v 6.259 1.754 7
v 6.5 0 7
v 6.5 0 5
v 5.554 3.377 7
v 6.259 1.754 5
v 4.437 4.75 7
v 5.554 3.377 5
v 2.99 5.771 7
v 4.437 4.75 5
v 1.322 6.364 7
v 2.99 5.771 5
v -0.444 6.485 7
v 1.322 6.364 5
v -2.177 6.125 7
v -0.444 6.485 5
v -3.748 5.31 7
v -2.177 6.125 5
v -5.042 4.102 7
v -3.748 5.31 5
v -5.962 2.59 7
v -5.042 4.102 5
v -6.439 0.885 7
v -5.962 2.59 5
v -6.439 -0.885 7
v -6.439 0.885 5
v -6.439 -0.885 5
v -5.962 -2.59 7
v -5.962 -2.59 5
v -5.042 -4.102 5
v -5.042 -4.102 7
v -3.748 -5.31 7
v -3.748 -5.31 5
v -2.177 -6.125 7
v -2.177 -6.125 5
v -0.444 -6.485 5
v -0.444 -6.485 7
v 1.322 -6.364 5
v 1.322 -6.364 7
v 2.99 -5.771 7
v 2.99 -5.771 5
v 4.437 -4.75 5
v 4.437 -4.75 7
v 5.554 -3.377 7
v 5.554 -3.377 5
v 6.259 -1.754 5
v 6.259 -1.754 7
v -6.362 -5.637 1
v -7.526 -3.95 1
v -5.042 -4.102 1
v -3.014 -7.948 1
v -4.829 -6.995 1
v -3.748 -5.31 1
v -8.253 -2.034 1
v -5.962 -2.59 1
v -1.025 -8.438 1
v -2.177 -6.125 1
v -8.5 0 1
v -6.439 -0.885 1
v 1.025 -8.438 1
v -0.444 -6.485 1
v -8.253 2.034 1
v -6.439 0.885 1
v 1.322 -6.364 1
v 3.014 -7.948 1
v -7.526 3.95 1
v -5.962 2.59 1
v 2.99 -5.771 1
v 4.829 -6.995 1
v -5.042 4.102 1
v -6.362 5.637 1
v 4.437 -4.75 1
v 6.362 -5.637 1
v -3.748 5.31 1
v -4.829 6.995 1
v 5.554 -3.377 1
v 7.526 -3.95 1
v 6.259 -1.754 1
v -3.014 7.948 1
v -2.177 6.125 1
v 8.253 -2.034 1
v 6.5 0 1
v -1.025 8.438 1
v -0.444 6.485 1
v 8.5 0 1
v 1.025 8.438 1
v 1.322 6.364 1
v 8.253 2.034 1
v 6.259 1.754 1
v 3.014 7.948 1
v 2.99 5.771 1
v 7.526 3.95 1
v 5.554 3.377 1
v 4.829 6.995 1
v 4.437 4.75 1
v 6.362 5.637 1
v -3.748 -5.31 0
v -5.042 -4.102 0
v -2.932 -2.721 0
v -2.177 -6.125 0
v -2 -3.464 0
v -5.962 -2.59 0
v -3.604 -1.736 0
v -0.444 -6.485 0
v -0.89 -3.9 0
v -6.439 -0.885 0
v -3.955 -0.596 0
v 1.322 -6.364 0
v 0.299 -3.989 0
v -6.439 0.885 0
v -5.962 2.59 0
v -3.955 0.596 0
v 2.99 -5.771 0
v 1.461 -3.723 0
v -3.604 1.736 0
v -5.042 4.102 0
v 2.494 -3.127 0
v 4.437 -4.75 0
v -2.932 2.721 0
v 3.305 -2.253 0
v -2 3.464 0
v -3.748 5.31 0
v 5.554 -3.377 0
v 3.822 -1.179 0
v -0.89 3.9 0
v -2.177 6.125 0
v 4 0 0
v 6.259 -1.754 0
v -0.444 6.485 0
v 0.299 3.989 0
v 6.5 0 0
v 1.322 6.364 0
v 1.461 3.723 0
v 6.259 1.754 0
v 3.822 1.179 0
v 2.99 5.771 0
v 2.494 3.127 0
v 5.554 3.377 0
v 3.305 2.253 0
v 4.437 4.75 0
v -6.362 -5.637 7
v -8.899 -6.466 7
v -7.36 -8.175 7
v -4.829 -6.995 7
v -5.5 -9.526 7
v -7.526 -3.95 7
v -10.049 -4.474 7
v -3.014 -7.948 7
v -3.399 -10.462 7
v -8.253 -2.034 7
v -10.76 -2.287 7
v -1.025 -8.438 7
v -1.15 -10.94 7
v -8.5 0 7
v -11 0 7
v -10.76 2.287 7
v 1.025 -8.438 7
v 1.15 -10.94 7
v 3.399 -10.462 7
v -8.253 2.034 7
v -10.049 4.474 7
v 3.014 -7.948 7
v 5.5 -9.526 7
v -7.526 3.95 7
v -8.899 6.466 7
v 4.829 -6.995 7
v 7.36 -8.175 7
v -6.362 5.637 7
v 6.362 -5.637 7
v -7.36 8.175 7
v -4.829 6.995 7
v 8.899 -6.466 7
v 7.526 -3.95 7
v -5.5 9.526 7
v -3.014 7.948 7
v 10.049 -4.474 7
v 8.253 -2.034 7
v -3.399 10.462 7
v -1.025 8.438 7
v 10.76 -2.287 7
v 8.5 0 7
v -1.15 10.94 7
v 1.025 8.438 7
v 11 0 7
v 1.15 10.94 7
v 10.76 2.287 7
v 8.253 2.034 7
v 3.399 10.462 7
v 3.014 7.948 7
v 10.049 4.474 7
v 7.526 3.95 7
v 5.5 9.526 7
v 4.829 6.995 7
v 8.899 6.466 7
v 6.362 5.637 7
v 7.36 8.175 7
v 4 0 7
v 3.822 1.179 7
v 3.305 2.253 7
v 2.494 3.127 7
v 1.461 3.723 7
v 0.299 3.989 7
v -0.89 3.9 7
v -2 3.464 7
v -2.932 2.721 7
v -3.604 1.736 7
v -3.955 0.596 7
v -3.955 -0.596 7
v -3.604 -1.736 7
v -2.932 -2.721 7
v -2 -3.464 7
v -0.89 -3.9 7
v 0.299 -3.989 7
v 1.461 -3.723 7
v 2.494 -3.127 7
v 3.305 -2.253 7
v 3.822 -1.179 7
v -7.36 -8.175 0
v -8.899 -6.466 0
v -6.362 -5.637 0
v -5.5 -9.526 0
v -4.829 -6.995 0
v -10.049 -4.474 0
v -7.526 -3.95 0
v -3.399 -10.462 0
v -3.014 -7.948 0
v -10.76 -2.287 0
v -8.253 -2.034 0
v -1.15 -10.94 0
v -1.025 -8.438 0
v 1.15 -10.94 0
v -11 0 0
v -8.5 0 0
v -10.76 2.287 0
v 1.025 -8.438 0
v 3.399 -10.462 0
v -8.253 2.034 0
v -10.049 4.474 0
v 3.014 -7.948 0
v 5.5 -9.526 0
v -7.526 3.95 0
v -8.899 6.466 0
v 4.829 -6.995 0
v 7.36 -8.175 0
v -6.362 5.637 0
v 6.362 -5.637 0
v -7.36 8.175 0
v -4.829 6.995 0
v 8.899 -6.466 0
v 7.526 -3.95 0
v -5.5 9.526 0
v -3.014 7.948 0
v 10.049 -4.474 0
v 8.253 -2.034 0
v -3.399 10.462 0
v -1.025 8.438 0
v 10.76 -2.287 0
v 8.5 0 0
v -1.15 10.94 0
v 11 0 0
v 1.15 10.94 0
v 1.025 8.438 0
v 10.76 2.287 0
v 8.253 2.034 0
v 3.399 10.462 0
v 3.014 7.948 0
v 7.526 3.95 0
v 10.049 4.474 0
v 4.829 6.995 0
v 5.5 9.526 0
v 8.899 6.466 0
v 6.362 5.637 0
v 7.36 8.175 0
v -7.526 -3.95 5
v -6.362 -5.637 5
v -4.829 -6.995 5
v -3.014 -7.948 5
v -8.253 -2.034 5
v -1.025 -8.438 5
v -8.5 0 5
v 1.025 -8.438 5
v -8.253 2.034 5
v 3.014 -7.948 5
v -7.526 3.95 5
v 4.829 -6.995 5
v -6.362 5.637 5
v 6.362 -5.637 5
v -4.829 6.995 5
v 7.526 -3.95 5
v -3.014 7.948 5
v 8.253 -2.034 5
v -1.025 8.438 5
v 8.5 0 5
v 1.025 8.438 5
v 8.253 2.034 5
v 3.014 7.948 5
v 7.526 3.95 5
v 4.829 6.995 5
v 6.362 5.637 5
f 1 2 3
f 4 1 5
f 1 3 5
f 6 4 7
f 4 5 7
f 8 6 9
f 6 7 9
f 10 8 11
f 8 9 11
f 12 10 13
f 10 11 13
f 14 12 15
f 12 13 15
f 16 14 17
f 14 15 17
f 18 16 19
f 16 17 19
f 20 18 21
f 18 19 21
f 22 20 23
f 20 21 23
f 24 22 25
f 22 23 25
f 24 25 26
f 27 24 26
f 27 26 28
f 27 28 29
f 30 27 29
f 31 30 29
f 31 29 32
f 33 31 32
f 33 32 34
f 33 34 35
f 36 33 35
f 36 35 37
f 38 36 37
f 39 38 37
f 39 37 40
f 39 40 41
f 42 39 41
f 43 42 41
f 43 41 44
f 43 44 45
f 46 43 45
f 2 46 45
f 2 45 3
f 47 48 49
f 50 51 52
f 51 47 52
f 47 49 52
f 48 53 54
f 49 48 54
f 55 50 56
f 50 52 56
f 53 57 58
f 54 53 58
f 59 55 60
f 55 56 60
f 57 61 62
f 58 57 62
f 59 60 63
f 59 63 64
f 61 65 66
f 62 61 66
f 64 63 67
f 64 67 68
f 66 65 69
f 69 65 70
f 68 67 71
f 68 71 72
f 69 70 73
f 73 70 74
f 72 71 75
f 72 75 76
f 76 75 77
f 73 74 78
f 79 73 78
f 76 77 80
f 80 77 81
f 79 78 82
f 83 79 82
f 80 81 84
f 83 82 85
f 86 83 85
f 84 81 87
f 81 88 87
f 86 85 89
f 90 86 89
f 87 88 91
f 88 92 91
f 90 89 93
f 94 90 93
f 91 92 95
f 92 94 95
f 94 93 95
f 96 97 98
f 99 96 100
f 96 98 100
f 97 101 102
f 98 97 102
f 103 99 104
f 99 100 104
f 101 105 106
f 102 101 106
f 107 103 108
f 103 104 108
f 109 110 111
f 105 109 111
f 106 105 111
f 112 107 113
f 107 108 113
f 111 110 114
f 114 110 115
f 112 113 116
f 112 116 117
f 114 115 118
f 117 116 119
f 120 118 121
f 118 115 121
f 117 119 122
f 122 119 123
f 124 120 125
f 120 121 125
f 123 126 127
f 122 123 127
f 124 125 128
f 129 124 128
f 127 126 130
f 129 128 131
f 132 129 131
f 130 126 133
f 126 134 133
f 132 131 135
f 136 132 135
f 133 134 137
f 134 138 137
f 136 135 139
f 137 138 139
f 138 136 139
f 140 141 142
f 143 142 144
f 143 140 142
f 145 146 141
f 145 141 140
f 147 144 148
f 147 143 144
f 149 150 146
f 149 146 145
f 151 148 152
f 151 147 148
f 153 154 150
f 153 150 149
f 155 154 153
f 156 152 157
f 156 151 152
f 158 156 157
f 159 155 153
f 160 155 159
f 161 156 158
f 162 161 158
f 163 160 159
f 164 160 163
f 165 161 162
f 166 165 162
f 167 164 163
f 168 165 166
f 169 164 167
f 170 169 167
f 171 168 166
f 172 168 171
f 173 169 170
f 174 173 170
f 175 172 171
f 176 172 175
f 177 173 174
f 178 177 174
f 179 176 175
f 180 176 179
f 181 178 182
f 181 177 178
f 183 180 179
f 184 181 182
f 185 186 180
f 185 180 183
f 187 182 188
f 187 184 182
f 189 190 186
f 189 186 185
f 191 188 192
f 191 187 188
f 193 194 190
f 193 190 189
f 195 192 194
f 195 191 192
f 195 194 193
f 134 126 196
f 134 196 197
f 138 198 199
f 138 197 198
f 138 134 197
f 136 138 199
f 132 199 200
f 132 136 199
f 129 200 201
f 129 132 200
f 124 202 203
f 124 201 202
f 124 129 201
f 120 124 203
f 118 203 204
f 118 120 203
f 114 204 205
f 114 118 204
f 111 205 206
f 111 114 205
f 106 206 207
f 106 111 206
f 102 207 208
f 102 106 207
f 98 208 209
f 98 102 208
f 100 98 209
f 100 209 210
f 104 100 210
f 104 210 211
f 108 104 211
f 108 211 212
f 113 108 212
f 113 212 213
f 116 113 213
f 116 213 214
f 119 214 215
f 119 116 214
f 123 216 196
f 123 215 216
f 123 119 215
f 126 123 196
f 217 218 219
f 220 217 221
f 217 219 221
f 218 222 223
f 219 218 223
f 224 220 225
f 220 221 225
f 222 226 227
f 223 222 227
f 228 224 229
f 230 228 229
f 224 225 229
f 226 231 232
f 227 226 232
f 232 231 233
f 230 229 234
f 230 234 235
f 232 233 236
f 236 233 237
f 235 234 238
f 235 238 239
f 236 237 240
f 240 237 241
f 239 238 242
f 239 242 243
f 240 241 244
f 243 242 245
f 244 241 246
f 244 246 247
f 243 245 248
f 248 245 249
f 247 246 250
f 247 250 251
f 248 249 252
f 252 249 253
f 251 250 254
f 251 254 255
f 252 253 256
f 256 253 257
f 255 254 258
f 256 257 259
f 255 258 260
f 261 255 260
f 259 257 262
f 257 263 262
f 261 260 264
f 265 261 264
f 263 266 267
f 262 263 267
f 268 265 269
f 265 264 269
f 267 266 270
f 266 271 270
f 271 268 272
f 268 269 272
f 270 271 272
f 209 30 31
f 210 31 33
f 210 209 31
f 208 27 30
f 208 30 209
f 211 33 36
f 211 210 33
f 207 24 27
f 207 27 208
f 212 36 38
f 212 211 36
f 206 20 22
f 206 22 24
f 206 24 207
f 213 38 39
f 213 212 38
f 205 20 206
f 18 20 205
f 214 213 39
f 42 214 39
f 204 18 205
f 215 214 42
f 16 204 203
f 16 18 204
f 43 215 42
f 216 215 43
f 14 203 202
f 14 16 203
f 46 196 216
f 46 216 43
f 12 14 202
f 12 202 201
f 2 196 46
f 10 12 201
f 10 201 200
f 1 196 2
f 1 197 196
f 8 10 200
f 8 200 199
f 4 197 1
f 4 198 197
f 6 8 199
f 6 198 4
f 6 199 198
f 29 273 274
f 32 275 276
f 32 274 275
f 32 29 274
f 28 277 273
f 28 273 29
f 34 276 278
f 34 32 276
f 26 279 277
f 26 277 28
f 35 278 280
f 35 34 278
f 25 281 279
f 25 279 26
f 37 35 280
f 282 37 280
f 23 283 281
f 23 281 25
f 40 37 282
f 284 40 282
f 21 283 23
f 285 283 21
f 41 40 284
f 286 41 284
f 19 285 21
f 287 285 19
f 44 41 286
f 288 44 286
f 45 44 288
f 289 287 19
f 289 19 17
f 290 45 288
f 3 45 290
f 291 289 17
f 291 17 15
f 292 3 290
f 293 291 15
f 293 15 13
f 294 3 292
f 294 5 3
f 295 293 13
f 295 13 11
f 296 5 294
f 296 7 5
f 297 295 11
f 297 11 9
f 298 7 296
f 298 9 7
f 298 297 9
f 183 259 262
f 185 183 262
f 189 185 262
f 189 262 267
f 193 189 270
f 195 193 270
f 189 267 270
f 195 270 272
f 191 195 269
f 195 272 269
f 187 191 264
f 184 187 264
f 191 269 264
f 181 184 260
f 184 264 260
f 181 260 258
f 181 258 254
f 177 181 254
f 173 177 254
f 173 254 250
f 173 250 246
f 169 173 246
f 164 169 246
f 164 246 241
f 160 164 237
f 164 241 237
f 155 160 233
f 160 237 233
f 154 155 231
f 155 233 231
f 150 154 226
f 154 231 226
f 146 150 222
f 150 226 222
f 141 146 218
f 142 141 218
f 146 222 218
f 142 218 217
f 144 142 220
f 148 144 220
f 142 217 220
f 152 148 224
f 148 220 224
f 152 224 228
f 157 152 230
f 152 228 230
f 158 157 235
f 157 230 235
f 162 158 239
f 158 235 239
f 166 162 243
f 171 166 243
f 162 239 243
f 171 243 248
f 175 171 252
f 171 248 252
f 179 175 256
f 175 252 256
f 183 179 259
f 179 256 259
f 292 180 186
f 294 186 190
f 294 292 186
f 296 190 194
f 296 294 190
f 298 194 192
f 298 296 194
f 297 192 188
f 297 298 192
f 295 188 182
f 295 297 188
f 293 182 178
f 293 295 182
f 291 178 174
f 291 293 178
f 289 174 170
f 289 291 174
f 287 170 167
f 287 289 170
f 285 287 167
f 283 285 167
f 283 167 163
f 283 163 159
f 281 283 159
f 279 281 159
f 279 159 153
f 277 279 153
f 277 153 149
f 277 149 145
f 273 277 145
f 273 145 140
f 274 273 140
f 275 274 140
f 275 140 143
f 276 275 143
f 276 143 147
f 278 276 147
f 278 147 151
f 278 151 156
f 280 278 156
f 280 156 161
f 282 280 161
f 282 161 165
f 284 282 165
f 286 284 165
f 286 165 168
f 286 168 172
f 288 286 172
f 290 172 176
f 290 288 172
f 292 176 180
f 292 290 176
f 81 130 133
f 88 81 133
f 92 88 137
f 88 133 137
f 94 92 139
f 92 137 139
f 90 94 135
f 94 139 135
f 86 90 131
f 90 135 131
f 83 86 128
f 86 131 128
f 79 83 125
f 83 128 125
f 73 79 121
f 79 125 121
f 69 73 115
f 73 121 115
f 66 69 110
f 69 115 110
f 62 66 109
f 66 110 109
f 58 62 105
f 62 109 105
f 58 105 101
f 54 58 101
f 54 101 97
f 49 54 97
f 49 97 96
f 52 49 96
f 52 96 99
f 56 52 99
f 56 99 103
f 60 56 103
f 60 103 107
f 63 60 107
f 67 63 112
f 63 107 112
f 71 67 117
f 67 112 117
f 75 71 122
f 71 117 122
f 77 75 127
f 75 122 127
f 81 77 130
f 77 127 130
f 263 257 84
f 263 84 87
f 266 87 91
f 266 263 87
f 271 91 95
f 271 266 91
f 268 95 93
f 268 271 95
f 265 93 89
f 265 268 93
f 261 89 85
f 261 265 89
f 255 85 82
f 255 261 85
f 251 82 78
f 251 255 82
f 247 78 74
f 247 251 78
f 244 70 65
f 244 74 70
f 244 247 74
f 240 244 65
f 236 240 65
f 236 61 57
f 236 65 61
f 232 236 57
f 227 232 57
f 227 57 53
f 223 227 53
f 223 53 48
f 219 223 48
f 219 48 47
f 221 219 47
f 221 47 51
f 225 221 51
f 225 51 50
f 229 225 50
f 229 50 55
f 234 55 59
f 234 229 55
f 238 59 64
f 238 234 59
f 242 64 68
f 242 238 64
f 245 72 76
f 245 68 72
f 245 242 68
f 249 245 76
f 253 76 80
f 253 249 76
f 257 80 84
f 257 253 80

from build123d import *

# Parameters (mm, degrees)
CYLINDER010_R     = 4
CYLINDER010_DEPTH = 9
CYLINDER009_R     = 6.5
CYLINDER009_DEPTH = 7
CYLINDER012_R     = 5.5
CYLINDER012_DEPTH = 7
CYLINDER011_R     = 9
CYLINDER011_DEPTH = 4
CYLINDER008_R     = 8.5
CYLINDER008_DEPTH = 8
CYLINDER007_R     = 11
CYLINDER007_DEPTH = 7


with BuildPart() as cilindro010:
    # Cylinder010 → Cylinder010 (new body)
    with BuildSketch(Plane.XY.offset(-1)):
        Circle(CYLINDER010_R)
    extrude(amount=CYLINDER010_DEPTH)


with BuildPart() as cut003:
    # Cylinder009 → Cylinder009 (new body)
    with BuildSketch(Plane.XY):
        Circle(CYLINDER009_R)
    extrude(amount=CYLINDER009_DEPTH)

    # Cut003: cut Cilindro010
    add(cilindro010.part, mode=Mode.SUBTRACT)


with BuildPart() as cilindro012:
    # Cylinder012 → Cylinder012 (new body)
    with BuildSketch(Plane.XY):
        Circle(CYLINDER012_R)
    extrude(amount=CYLINDER012_DEPTH)


with BuildPart() as cut004:
    # Cylinder011 → Cylinder011 (new body)
    with BuildSketch(Plane.XY.offset(1)):
        Circle(CYLINDER011_R)
    extrude(amount=CYLINDER011_DEPTH)

    # Cut004: cut Cilindro012
    add(cilindro012.part, mode=Mode.SUBTRACT)


with BuildPart() as cilindro008:
    # Cylinder008 → Cylinder008 (new body)
    with BuildSketch(Plane.XY.offset(-1)):
        Circle(CYLINDER008_R)
    extrude(amount=CYLINDER008_DEPTH)


with BuildPart() as f_608zz:
    # Cylinder007 → Cylinder007 (new body)
    with BuildSketch(Plane.XY):
        Circle(CYLINDER007_R)
    extrude(amount=CYLINDER007_DEPTH)

    # Cut002: cut Cilindro008
    add(cilindro008.part, mode=Mode.SUBTRACT)

    # Fusion003: union Cut003, Cut004
    add(cut003.part)
    add(cut004.part)


solid = f_608zz.part
